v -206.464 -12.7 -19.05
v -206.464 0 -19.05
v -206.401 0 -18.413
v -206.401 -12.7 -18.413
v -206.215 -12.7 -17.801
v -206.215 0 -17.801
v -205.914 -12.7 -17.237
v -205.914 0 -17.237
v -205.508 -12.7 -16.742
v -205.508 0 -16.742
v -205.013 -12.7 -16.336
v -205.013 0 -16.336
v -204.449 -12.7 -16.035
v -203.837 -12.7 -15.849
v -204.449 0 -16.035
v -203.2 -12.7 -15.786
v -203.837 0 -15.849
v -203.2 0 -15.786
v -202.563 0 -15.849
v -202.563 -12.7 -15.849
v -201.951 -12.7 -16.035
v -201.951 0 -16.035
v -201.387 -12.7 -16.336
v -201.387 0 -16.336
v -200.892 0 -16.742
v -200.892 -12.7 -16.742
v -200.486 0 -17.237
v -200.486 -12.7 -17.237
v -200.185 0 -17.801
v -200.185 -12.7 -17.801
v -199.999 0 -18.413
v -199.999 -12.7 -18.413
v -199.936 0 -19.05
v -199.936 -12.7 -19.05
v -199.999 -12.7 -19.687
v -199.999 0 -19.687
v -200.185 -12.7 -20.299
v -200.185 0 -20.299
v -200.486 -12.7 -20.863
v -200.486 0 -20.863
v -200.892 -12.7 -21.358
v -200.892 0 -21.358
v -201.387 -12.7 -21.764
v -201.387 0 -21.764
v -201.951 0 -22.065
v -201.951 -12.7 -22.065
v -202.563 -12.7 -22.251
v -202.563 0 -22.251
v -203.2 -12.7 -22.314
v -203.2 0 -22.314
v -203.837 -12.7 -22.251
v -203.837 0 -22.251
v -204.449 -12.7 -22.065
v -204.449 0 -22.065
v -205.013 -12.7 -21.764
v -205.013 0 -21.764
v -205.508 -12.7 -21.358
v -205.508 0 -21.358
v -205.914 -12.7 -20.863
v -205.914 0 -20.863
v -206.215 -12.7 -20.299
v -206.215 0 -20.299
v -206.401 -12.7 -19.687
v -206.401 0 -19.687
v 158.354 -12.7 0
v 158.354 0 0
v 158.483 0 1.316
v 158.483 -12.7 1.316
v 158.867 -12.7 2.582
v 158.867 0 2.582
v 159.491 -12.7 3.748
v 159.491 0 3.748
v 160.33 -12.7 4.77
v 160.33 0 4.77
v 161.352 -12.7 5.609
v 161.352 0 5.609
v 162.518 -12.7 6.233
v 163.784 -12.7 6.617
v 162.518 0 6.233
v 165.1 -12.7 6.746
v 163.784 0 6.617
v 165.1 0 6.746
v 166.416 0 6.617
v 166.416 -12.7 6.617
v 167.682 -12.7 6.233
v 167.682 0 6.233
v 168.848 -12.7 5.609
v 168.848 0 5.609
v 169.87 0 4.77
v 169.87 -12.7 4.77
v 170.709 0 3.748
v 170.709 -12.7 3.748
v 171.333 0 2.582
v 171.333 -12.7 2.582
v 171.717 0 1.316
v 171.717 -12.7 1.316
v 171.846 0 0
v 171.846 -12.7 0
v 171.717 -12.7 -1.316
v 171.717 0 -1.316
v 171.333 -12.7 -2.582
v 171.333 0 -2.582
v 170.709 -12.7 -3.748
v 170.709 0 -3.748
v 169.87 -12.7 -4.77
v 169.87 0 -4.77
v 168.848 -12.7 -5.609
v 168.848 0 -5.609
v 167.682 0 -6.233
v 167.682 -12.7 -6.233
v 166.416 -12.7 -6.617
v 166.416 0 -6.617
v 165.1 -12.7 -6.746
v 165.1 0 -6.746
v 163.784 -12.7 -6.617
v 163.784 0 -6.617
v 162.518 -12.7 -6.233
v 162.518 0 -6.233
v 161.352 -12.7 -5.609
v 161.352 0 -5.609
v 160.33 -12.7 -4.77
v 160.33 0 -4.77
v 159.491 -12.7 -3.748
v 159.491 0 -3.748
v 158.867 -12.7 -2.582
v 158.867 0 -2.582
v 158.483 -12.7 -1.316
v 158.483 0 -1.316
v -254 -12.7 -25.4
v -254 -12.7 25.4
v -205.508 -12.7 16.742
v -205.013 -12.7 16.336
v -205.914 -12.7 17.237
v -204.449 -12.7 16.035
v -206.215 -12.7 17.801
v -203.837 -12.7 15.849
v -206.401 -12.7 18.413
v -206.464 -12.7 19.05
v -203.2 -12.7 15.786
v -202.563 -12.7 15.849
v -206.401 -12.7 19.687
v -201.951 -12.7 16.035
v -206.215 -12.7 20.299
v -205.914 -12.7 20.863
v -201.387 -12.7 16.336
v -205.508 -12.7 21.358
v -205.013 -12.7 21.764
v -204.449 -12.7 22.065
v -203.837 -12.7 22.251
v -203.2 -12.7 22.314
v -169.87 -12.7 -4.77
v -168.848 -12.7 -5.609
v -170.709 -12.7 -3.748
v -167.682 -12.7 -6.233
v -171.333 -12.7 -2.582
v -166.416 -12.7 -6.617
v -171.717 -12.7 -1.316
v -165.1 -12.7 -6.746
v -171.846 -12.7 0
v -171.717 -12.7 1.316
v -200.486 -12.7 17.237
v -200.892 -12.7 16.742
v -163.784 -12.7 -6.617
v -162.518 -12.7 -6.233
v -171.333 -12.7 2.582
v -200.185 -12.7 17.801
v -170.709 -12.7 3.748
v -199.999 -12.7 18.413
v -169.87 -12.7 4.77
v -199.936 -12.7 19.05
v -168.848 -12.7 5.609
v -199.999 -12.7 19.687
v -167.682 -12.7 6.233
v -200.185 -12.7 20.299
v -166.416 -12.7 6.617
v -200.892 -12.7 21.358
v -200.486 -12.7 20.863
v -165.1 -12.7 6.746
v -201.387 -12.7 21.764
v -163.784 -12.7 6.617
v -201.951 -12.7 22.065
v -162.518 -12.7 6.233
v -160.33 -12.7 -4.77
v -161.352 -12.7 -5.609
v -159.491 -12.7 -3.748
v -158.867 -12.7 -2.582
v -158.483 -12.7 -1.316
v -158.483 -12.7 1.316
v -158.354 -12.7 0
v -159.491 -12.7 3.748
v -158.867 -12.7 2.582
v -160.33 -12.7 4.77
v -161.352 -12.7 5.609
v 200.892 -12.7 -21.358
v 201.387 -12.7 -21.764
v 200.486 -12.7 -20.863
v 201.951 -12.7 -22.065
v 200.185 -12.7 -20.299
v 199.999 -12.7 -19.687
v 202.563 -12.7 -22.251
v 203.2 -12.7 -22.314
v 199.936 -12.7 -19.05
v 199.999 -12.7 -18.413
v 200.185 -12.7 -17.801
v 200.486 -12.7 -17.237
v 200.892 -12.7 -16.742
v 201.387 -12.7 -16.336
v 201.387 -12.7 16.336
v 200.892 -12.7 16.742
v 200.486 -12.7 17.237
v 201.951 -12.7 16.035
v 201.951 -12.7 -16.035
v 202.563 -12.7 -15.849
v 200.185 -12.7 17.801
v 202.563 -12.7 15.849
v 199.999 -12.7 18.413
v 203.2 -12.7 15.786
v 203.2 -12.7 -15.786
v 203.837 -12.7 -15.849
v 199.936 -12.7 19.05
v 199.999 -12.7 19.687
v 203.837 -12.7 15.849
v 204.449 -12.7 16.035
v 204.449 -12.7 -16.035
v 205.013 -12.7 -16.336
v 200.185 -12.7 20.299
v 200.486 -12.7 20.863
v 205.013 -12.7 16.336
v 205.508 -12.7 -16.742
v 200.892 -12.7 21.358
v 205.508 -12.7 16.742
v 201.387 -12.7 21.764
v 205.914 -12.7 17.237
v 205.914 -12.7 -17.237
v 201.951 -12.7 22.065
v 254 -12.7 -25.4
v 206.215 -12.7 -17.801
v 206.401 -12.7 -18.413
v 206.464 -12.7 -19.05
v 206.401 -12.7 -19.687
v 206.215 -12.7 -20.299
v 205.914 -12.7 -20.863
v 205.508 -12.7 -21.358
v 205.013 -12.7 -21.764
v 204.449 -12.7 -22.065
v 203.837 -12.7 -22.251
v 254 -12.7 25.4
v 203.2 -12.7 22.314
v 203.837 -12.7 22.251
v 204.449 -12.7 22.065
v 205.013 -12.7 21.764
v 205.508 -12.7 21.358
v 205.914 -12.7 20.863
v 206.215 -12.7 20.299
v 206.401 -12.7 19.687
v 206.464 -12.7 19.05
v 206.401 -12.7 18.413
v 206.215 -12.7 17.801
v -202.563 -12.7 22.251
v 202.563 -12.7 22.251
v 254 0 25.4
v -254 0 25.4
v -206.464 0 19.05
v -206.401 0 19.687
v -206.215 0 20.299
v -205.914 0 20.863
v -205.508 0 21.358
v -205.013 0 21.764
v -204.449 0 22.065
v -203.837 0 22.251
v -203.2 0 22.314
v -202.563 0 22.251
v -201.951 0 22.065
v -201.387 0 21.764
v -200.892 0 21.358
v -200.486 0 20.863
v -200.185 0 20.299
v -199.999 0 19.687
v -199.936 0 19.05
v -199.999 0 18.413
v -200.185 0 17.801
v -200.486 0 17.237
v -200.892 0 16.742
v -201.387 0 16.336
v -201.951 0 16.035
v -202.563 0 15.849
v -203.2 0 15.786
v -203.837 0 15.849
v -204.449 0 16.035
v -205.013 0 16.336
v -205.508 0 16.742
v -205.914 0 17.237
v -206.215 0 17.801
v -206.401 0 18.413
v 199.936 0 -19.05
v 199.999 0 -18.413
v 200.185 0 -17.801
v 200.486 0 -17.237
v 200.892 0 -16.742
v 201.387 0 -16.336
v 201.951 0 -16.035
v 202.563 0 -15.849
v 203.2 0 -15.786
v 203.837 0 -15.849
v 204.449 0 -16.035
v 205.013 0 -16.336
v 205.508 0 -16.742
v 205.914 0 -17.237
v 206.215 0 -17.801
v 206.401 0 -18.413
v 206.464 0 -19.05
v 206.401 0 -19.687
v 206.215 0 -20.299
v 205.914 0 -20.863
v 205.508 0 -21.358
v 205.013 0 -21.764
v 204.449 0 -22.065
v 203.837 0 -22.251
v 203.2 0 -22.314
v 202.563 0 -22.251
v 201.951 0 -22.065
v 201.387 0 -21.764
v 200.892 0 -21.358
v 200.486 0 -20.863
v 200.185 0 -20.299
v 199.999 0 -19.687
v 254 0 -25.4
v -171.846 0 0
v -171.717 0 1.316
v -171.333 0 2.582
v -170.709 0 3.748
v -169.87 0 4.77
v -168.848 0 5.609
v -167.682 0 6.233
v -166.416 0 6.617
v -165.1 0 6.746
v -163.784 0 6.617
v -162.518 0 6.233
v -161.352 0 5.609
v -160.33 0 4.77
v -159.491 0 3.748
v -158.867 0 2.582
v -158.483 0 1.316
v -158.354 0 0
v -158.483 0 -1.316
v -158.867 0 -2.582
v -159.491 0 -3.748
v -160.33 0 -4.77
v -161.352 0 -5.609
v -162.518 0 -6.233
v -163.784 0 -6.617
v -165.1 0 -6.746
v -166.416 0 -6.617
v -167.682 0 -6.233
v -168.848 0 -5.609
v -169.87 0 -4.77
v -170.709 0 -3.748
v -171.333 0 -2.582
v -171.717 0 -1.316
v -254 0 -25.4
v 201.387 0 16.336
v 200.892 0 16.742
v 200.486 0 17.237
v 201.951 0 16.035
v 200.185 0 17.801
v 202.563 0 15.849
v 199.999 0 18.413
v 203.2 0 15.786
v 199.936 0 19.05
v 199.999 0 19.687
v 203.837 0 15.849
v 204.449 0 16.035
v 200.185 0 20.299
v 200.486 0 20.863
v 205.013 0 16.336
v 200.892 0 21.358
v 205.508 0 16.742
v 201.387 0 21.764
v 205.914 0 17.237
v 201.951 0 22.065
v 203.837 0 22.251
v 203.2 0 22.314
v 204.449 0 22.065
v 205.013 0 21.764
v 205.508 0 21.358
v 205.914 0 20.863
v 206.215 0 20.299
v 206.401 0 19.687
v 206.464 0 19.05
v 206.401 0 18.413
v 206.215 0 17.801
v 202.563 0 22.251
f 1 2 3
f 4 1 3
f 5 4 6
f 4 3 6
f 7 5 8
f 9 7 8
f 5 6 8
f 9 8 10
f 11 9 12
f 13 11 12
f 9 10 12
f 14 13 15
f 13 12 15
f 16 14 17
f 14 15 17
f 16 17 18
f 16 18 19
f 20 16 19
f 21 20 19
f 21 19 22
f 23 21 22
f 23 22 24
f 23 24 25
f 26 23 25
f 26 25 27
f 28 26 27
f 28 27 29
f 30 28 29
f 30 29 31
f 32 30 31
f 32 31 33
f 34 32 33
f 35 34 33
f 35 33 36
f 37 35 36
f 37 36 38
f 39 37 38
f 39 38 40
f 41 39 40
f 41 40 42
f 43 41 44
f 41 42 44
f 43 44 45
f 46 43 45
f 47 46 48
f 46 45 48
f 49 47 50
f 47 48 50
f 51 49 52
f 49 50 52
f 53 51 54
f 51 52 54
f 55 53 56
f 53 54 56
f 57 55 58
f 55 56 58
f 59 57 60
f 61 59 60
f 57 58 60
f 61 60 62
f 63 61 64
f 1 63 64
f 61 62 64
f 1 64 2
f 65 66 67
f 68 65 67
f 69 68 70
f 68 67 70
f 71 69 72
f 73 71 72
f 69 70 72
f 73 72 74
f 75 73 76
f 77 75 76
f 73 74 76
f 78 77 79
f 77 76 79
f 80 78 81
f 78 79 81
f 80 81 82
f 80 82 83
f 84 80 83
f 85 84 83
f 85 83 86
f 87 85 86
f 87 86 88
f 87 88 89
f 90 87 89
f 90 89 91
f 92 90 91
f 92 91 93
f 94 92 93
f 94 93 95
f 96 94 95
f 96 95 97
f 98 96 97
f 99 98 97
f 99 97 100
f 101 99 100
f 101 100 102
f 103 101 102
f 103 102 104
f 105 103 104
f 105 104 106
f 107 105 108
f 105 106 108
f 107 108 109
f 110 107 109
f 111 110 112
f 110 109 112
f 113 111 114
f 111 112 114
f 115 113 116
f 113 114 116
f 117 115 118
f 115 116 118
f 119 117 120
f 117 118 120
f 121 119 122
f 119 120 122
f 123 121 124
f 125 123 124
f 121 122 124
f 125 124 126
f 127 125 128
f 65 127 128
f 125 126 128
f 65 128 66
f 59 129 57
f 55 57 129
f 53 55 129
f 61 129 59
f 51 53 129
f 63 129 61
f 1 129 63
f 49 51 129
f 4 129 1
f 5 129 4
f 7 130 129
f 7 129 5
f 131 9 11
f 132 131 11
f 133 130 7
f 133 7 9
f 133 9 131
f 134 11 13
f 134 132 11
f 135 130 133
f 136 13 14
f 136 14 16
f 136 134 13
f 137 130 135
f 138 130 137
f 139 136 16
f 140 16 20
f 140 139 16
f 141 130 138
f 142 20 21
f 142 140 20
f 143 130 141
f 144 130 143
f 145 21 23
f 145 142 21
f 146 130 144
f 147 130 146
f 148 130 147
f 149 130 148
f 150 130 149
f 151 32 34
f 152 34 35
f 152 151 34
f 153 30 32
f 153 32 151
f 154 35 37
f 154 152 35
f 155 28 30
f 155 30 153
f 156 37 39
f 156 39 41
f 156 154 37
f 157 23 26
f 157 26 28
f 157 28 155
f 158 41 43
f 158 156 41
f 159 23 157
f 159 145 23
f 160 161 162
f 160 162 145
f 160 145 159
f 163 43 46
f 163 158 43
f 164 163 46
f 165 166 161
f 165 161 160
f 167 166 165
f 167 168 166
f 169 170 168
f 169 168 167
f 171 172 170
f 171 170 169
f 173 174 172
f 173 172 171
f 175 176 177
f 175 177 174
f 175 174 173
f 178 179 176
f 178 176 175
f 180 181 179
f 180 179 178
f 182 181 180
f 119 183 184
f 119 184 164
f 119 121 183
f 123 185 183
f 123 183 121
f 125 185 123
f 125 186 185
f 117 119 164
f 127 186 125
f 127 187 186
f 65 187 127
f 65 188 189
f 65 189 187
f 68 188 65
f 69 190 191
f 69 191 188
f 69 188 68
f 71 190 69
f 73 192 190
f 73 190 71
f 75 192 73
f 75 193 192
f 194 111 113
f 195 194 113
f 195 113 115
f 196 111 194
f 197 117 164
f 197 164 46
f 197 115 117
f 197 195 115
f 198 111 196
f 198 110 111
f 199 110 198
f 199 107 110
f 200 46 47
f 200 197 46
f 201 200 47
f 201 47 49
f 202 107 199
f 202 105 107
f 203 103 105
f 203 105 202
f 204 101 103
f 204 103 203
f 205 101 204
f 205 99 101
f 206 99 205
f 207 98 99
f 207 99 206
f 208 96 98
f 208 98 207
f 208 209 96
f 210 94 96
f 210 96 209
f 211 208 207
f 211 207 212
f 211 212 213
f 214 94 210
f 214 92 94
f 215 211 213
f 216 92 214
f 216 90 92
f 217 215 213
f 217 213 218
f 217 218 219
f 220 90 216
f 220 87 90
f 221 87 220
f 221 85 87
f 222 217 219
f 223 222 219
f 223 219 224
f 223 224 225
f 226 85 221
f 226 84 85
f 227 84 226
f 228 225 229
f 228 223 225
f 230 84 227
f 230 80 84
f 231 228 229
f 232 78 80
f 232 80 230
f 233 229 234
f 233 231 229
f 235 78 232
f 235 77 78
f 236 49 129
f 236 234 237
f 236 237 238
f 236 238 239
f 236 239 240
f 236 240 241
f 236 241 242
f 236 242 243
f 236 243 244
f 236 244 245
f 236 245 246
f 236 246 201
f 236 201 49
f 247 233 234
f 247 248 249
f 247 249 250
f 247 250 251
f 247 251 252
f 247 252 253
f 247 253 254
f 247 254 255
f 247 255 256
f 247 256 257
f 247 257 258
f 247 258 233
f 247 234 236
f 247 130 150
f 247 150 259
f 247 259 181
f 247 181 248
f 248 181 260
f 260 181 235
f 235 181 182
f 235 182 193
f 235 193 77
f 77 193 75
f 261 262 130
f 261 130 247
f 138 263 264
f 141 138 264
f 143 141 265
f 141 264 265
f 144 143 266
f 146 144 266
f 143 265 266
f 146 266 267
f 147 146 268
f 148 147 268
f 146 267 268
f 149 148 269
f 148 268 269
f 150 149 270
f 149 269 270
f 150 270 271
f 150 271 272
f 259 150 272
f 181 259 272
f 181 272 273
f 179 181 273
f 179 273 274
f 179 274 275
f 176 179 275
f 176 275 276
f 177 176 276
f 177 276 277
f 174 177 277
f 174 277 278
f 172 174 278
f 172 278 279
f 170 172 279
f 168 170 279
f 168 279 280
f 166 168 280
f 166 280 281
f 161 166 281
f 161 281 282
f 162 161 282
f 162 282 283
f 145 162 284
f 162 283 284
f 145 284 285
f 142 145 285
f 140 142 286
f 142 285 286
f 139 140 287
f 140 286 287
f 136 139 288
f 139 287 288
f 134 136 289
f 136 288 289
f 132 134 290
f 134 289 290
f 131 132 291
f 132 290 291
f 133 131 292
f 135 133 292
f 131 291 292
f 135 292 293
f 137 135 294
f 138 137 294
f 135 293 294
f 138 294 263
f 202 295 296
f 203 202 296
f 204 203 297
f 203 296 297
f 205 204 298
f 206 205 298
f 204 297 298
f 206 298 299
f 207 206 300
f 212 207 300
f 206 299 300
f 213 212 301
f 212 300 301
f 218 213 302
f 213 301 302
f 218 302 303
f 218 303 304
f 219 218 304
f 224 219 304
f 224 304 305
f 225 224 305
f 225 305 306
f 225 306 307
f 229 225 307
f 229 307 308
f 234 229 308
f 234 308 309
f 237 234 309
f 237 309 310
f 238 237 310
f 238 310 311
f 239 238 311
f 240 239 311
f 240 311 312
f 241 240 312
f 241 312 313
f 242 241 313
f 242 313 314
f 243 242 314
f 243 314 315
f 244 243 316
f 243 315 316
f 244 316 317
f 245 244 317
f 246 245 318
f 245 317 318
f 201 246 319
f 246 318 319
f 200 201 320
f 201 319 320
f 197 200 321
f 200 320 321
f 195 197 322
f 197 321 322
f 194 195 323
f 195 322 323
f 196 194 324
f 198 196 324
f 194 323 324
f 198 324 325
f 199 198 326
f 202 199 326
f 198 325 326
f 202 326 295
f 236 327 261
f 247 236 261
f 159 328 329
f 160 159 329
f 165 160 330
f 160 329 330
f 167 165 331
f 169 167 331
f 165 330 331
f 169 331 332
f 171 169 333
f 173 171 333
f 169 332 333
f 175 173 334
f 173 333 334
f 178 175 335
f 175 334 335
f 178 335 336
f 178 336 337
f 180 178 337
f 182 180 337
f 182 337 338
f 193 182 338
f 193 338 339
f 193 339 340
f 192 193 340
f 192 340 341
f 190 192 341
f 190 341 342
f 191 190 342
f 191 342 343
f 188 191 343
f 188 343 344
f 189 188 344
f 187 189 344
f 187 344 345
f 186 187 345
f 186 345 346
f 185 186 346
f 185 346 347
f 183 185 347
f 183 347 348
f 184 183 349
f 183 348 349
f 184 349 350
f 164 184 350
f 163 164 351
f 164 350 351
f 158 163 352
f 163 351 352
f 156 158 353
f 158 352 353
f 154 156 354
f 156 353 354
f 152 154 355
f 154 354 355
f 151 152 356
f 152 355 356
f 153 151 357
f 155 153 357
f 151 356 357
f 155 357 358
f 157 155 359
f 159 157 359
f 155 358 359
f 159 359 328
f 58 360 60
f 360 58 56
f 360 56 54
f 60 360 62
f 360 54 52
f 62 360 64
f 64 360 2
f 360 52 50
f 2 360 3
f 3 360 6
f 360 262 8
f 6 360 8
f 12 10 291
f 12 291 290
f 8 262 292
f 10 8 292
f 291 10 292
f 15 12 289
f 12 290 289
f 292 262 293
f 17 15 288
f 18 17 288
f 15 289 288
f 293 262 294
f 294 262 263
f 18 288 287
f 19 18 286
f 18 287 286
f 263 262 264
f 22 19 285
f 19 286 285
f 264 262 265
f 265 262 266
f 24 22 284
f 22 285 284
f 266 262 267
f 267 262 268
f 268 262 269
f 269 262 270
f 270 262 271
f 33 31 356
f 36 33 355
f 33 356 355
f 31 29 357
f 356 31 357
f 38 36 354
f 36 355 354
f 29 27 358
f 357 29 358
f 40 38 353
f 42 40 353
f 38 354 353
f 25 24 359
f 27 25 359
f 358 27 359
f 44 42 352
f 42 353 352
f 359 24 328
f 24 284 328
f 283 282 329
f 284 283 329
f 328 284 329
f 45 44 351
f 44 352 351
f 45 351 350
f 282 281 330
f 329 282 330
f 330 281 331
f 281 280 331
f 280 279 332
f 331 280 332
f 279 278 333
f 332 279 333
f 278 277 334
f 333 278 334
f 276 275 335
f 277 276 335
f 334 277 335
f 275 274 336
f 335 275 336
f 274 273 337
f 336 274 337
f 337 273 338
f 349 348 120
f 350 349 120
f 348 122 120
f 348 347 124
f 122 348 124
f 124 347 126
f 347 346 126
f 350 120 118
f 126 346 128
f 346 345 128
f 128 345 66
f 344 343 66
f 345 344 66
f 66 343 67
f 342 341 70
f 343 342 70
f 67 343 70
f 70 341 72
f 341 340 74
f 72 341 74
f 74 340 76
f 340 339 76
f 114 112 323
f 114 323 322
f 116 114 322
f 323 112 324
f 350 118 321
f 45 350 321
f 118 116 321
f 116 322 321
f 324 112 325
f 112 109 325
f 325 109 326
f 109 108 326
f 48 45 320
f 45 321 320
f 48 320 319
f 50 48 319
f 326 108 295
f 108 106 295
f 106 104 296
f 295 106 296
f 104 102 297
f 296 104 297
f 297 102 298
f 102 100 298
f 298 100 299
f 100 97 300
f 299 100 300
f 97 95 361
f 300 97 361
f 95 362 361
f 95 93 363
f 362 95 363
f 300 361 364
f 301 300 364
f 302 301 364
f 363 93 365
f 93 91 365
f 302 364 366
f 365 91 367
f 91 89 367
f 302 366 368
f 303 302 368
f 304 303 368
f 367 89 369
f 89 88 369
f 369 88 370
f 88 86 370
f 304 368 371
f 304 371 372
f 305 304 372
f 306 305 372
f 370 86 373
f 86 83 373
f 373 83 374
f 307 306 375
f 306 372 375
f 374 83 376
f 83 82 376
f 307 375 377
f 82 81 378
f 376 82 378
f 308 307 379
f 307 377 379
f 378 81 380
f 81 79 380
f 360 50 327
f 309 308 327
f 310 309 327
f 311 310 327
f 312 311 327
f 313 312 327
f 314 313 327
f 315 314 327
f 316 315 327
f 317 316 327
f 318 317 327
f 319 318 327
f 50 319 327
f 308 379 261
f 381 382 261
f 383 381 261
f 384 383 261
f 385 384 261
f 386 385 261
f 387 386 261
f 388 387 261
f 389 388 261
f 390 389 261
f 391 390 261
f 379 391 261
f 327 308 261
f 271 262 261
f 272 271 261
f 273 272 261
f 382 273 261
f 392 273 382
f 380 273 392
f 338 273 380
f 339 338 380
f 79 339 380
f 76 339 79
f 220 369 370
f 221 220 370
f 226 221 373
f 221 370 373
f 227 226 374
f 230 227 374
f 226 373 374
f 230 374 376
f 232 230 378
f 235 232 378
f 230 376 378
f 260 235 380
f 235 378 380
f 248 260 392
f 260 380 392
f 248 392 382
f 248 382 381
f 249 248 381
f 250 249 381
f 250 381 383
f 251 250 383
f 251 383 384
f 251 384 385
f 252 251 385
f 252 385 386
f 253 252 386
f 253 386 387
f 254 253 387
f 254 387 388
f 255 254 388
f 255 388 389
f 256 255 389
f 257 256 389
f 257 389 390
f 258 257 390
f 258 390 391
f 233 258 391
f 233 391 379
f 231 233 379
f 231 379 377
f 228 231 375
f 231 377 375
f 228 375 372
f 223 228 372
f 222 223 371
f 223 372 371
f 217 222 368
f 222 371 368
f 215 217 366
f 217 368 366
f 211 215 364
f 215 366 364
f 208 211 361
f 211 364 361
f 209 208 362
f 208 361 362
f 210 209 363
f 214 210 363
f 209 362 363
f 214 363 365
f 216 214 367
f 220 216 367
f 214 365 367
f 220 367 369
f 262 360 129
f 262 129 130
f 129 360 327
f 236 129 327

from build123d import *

# Parameters (mm, degrees)
F0_W     = 508
F0_H     = 50.8
F1_DEPTH = 12.7
F3_D     = 6.5278
F5_D     = 13.49248


with BuildPart() as f1:
    # F0 (on Front) → F1 (new body)
    with BuildSketch(Plane.XZ):
        Rectangle(F0_W, F0_H)
    extrude(amount=F1_DEPTH)

    # F3 (through all)
    with Locations(Plane.XZ.offset(12.7)):
        with Locations((-203.2, 19.05), (203.2, 19.05), (-203.2, -19.05), (203.2, -19.05)):
            Hole(F3_D / 2)

    # F5 (through all)
    with Locations(Plane.XZ.offset(12.7)):
        with Locations((165.1, 0), (-165.1, 0)):
            Hole(F5_D / 2)


solid = f1.part
